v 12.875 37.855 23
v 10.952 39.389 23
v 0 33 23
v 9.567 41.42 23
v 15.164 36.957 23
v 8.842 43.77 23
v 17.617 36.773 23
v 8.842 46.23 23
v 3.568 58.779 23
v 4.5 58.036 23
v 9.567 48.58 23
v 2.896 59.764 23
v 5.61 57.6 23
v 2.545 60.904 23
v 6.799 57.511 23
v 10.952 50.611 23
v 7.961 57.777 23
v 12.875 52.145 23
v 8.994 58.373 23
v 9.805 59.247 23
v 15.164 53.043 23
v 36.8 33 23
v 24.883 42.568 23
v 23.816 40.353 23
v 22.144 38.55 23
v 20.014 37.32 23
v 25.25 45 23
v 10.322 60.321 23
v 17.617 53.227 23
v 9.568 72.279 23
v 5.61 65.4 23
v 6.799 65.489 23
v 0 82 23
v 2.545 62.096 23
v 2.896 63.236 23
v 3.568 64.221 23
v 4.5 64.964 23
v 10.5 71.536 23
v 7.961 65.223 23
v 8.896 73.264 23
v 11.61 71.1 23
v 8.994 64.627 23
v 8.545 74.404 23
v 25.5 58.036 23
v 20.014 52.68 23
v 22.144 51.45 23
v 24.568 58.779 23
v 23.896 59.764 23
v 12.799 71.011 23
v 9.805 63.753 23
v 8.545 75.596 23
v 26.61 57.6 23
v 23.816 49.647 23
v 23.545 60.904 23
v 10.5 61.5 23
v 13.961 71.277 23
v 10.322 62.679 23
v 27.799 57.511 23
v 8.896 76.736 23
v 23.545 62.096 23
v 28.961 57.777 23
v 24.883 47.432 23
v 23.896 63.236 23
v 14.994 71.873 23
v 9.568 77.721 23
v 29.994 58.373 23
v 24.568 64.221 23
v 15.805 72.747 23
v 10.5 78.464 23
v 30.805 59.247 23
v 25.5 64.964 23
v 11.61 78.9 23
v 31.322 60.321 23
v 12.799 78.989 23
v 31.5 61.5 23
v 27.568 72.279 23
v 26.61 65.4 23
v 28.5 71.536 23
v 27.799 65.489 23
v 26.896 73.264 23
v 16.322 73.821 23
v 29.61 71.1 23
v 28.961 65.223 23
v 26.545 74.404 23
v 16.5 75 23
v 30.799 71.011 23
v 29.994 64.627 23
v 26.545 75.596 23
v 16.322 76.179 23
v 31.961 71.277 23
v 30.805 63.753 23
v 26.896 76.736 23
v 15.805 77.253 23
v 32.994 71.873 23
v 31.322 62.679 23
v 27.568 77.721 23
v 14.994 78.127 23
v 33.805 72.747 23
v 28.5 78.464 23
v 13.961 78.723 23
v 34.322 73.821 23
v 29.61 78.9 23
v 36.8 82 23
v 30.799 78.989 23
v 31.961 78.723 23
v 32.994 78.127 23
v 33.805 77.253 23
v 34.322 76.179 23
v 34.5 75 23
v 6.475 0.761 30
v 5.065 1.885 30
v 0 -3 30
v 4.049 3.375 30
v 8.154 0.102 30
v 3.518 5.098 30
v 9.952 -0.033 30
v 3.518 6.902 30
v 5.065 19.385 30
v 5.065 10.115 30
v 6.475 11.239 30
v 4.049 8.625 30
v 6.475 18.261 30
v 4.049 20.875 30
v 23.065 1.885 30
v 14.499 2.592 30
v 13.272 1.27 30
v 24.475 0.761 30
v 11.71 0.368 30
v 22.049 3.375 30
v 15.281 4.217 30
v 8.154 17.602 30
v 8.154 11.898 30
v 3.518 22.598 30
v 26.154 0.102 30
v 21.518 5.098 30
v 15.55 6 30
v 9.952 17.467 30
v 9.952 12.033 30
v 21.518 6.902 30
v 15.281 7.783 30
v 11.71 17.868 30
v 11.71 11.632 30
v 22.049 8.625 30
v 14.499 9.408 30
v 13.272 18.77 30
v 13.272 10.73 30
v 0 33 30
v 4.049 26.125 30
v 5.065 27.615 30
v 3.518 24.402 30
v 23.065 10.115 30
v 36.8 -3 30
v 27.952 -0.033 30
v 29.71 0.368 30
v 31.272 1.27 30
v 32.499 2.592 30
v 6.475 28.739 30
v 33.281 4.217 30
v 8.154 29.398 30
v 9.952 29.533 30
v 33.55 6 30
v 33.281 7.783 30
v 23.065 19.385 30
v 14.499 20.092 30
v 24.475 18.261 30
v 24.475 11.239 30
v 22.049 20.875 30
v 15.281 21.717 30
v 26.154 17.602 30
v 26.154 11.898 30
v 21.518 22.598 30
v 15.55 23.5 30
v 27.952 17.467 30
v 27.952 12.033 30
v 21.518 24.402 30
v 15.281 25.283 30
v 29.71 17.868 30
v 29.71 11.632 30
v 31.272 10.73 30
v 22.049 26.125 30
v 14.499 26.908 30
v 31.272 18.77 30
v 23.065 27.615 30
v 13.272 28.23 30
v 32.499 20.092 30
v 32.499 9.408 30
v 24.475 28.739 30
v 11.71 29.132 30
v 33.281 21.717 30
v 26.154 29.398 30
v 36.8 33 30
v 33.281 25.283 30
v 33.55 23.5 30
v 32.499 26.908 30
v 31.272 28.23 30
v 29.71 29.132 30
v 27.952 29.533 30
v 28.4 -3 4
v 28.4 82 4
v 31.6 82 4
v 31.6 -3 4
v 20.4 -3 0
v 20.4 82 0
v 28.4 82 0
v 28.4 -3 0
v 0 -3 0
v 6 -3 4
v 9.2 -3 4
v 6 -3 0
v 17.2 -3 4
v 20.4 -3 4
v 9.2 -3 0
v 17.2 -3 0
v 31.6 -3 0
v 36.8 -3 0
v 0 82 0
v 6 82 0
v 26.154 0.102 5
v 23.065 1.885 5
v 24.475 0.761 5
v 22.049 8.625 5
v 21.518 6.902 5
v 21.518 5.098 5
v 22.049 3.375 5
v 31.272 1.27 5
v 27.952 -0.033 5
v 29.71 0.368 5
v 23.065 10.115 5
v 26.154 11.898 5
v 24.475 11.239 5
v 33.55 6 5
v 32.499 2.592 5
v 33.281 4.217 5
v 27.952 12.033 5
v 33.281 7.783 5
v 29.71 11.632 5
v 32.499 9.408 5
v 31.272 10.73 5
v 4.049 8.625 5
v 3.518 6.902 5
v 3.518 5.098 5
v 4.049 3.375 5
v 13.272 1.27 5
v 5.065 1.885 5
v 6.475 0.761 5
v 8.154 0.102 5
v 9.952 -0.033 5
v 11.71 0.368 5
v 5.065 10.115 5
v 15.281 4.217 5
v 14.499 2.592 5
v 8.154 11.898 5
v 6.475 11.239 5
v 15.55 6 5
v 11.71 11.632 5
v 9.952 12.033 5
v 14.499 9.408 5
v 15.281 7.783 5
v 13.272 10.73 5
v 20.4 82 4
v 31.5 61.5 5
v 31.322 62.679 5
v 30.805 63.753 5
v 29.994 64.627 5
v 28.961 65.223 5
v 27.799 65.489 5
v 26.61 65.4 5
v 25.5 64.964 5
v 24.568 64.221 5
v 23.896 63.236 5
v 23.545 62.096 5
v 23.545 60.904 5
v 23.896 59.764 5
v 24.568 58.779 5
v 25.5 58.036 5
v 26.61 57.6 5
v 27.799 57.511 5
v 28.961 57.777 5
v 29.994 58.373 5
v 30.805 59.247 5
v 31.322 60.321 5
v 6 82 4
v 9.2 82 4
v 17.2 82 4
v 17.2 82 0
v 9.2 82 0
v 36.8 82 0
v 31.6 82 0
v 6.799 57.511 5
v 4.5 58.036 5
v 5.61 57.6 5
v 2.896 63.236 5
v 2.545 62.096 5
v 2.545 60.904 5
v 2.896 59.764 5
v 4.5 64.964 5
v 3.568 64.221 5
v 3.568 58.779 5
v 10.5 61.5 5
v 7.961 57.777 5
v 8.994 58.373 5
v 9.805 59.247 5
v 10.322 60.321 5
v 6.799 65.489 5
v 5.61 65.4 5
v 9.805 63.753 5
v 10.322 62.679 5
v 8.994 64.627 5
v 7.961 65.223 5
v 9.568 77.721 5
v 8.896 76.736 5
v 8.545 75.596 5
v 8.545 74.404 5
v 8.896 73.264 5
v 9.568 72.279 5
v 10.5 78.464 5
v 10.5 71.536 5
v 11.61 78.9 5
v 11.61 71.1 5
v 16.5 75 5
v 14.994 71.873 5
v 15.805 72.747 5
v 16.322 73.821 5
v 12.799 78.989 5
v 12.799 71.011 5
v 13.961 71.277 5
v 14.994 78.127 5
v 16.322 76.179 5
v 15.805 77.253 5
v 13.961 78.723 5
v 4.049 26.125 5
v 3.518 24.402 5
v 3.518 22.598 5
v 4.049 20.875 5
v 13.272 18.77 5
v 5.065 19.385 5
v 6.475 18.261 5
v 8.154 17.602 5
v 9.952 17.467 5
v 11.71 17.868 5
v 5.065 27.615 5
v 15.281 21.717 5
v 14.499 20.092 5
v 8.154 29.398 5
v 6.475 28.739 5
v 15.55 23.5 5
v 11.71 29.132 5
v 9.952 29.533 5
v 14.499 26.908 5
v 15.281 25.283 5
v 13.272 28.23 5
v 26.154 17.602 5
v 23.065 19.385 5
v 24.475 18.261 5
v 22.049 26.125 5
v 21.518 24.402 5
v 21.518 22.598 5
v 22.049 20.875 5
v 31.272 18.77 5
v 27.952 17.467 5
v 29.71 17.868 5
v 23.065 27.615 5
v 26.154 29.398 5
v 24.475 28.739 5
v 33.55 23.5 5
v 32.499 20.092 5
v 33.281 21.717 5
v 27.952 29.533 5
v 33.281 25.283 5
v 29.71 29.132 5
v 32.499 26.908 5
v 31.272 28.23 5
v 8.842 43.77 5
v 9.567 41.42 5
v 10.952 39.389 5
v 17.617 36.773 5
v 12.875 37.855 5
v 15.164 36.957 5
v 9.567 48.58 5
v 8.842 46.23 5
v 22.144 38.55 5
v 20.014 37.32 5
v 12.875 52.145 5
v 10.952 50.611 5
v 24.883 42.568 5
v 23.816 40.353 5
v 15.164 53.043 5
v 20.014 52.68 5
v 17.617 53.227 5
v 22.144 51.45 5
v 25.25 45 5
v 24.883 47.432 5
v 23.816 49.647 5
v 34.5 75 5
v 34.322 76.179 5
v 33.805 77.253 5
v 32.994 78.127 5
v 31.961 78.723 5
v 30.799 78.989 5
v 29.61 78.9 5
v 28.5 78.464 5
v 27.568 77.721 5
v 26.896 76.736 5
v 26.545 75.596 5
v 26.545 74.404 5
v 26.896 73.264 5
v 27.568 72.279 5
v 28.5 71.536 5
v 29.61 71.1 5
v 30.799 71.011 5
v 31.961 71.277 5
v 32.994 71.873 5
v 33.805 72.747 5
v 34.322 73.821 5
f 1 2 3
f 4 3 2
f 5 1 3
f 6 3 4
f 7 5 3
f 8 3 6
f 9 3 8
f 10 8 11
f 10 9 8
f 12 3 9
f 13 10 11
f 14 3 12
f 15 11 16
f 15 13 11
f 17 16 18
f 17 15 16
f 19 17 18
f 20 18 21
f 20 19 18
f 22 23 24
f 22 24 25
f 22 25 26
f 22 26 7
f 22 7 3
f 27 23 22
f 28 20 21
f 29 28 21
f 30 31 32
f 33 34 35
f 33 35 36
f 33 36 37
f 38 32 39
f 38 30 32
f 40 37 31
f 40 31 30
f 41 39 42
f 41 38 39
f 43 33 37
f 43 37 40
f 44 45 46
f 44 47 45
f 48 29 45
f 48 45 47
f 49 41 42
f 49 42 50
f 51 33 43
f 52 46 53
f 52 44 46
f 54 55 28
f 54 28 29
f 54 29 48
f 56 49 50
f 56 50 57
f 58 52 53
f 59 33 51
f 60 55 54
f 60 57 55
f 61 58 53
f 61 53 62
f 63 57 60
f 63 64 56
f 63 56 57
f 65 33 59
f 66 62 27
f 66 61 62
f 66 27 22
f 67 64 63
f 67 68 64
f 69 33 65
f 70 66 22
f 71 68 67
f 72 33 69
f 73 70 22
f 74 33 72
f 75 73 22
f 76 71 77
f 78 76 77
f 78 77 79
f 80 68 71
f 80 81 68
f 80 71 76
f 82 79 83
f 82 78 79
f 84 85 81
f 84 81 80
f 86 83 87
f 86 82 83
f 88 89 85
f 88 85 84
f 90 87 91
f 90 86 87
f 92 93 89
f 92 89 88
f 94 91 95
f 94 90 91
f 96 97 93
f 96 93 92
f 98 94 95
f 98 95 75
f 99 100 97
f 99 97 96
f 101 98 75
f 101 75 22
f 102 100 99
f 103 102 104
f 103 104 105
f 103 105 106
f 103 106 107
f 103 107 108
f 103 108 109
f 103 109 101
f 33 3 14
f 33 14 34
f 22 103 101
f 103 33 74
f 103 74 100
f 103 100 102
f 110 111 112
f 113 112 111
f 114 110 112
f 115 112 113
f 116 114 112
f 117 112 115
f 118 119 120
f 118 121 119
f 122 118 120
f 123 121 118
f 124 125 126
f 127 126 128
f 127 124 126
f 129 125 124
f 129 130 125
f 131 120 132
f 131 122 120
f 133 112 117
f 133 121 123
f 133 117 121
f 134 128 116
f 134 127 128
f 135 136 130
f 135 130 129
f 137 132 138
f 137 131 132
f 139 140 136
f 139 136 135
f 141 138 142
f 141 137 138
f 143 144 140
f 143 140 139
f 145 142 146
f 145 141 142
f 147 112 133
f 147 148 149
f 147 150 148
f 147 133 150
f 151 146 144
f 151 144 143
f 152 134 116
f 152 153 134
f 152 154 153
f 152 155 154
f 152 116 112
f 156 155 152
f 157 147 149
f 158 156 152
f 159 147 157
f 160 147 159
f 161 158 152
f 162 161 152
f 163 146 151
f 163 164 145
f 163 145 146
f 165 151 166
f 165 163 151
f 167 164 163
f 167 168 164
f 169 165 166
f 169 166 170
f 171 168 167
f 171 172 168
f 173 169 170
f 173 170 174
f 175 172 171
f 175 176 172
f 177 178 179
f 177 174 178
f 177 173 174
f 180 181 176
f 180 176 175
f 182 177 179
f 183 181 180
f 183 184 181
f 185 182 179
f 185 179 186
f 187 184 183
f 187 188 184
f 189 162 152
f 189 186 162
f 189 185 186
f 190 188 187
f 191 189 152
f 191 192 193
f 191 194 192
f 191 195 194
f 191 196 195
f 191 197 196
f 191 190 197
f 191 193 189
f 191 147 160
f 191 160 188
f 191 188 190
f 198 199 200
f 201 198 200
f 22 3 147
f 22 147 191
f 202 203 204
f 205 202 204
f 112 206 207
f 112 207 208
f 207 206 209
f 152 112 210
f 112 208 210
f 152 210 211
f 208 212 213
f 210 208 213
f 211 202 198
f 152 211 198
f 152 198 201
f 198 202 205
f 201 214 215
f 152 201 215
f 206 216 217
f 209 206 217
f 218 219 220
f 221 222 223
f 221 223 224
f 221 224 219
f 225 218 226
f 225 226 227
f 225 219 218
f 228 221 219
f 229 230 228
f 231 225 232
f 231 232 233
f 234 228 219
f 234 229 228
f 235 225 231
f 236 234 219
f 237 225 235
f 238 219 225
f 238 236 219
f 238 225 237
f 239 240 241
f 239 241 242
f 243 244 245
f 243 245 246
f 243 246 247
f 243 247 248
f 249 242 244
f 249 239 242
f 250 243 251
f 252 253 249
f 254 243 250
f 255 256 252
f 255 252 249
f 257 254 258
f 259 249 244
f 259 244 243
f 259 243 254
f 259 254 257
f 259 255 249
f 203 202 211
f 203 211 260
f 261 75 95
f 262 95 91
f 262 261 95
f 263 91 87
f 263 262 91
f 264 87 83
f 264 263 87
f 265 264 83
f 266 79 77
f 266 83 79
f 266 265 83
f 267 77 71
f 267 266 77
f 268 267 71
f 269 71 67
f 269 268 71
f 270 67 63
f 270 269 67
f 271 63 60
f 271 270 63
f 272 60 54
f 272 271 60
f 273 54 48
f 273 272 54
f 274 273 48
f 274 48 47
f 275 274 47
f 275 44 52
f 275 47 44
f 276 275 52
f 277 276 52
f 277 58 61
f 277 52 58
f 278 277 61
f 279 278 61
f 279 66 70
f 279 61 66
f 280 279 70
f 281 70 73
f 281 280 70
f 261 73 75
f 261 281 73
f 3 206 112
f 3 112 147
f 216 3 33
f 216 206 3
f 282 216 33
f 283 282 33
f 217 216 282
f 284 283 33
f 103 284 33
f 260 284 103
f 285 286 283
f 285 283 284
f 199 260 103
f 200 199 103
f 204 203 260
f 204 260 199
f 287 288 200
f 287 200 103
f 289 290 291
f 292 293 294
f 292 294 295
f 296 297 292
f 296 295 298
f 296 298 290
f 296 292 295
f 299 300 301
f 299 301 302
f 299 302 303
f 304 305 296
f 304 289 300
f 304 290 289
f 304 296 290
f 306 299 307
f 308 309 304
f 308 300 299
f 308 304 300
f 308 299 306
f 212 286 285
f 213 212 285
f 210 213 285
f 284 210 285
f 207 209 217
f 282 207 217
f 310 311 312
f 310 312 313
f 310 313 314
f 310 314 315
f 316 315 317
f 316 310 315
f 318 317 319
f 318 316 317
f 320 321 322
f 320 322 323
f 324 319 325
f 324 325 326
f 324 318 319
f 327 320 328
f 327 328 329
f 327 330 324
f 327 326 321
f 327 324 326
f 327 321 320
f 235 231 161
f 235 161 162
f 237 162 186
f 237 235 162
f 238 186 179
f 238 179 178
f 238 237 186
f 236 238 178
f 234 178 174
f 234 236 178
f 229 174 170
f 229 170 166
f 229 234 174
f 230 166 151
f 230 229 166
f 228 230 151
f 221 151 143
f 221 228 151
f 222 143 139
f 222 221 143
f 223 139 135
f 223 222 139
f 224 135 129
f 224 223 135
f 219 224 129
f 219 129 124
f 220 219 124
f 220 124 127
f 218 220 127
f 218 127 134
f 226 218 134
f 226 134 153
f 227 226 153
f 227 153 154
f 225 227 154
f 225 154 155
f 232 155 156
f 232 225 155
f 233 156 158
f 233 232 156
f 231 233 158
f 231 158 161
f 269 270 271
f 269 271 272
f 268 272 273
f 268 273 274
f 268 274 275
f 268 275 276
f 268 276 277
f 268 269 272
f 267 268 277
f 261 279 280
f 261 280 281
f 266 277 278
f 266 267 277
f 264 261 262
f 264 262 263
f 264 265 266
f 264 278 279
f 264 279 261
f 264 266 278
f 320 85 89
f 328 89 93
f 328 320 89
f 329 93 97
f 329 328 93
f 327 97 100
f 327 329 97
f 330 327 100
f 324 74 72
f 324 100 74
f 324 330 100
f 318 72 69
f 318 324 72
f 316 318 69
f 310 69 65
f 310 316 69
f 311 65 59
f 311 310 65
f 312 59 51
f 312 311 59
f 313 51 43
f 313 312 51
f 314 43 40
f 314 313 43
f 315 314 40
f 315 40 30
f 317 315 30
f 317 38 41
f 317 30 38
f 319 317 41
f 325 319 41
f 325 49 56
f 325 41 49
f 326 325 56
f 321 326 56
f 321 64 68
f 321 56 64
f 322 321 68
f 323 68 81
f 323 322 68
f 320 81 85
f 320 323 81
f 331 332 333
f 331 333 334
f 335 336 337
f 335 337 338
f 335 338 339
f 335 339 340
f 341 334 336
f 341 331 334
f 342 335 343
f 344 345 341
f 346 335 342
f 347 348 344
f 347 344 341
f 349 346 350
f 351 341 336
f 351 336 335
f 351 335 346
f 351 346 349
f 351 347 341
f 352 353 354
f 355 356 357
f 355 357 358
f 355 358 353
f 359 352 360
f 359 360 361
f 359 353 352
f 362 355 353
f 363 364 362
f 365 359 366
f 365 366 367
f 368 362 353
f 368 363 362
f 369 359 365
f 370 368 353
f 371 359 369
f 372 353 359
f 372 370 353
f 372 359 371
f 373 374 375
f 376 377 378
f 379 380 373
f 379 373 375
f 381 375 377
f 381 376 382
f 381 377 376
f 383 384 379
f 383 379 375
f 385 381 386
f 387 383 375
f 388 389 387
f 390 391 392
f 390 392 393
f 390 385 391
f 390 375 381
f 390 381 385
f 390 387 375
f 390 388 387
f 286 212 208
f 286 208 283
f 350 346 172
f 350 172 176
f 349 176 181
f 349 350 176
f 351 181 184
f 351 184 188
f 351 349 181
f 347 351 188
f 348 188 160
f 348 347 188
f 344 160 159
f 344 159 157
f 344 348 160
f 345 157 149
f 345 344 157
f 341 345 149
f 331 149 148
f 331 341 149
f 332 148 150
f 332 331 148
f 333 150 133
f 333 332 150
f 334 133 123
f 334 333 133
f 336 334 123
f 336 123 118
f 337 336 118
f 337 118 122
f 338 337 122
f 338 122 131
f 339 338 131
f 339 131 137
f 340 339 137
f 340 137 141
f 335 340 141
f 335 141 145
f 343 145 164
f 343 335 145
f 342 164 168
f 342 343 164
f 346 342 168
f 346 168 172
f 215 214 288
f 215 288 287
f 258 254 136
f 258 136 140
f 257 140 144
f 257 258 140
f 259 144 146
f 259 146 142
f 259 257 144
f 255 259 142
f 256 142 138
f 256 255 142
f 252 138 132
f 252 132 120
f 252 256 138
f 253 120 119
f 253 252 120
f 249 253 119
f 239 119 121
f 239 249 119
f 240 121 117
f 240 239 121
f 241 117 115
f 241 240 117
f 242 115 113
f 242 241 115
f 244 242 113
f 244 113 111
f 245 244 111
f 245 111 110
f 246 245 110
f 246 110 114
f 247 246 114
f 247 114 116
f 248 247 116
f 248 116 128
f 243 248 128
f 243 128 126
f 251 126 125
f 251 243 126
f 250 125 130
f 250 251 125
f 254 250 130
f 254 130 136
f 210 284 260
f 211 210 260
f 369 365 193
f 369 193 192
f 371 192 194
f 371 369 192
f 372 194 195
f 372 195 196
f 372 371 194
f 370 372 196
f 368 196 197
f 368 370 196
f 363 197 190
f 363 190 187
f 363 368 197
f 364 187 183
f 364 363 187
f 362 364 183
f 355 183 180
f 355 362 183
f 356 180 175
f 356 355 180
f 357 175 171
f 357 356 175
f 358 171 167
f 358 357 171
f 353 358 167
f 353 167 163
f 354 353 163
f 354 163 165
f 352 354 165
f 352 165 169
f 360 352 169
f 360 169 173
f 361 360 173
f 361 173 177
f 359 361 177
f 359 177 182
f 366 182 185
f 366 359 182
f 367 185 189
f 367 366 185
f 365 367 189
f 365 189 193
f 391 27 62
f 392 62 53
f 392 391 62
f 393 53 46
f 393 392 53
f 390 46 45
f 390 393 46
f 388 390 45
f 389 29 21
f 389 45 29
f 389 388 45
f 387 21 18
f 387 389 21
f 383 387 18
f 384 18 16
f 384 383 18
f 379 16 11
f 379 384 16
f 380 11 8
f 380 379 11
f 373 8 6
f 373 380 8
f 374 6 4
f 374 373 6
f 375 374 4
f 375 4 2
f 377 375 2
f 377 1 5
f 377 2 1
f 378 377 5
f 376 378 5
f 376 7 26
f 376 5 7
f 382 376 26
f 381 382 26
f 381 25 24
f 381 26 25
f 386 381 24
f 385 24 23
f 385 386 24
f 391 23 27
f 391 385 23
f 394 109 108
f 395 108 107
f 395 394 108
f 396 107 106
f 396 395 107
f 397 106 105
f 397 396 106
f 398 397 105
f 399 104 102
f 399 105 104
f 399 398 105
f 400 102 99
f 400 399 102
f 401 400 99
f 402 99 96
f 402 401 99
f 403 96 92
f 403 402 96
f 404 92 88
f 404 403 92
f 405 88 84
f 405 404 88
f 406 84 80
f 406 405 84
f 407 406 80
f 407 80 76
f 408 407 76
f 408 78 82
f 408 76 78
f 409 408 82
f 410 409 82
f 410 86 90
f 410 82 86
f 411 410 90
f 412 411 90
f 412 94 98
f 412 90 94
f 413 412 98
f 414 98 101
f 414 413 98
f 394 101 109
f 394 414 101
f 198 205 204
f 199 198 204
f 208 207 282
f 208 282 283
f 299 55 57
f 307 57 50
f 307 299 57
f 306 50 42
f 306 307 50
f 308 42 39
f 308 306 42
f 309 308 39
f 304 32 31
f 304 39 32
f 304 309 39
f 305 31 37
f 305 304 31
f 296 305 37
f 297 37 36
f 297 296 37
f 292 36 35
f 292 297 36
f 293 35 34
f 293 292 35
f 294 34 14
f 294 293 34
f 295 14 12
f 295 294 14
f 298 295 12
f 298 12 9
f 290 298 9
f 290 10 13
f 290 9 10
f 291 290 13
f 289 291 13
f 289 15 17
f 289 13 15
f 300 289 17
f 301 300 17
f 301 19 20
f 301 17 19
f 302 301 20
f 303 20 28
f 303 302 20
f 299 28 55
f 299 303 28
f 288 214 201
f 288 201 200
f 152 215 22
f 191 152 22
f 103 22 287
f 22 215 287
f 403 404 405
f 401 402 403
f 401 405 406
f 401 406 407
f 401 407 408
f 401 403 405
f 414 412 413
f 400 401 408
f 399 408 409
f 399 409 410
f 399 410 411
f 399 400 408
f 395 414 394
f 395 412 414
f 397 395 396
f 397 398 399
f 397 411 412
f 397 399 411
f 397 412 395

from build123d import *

# Parameters (mm, degrees)
CYLINDER008_R     = 8.25
CYLINDER008_DEPTH = 30
BOX008_W          = 3.2
BOX008_H          = 90
BOX008_DEPTH      = 4
BOX006_W          = 3.2
BOX006_H          = 90
BOX006_DEPTH      = 4
BOX004_W          = 3.2
BOX004_H          = 90
BOX004_DEPTH      = 4
CYLINDER007_R     = 4
CYLINDER007_DEPTH = 25
CYLINDER006_R     = 4
CYLINDER006_DEPTH = 25
CYLINDER005_R     = 4
CYLINDER005_DEPTH = 25
CYLINDER004_R     = 4
CYLINDER004_DEPTH = 25
CYLINDER003_R     = 6.05
CYLINDER003_DEPTH = 25
CYLINDER002_R     = 6.05
CYLINDER002_DEPTH = 25
CYLINDER001_R     = 6.05
CYLINDER001_DEPTH = 25
CYLINDER_R        = 6.05
CYLINDER_DEPTH    = 25
BOX001_W          = 40
BOX001_H          = 55
BOX001_DEPTH      = 7
BOX_W             = 36.8
BOX_H             = 85
BOX_DEPTH         = 30


with BuildPart() as cylinder008:
    # Cylinder008 → Cylinder008 (new body)
    with BuildSketch(Plane(origin=(17, 45, 5), x_dir=(1, 0, 0), z_dir=(0, 0, 1))):
        Circle(CYLINDER008_R)
    extrude(amount=CYLINDER008_DEPTH)


with BuildPart() as cube008:
    # Box008 → Box008 (new body)
    with BuildSketch(Plane(origin=(28.4, -3, 0), x_dir=(1, 0, 0), z_dir=(0, 0, 1))):
        with Locations((1.6, 45)):
            Rectangle(BOX008_W, BOX008_H)
    extrude(amount=BOX008_DEPTH)


with BuildPart() as cube006:
    # Box006 → Box006 (new body)
    with BuildSketch(Plane(origin=(17.2, -3, 0), x_dir=(1, 0, 0), z_dir=(0, 0, 1))):
        with Locations((1.6, 45)):
            Rectangle(BOX006_W, BOX006_H)
    extrude(amount=BOX006_DEPTH)


with BuildPart() as cube004:
    # Box004 → Box004 (new body)
    with BuildSketch(Plane(origin=(6, -3, 0), x_dir=(1, 0, 0), z_dir=(0, 0, 1))):
        with Locations((1.6, 45)):
            Rectangle(BOX004_W, BOX004_H)
    extrude(amount=BOX004_DEPTH)


with BuildPart() as cylinder007:
    # Cylinder007 → Cylinder007 (new body)
    with BuildSketch(Plane(origin=(6.5, 61.5, 5), x_dir=(1, 0, 0), z_dir=(0, 0, 1))):
        Circle(CYLINDER007_R)
    extrude(amount=CYLINDER007_DEPTH)


with BuildPart() as cylinder006:
    # Cylinder006 → Cylinder006 (new body)
    with BuildSketch(Plane(origin=(30.5, 75, 5), x_dir=(1, 0, 0), z_dir=(0, 0, 1))):
        Circle(CYLINDER006_R)
    extrude(amount=CYLINDER006_DEPTH)


with BuildPart() as cylinder005:
    # Cylinder005 → Cylinder005 (new body)
    with BuildSketch(Plane(origin=(27.5, 61.5, 5), x_dir=(1, 0, 0), z_dir=(0, 0, 1))):
        Circle(CYLINDER005_R)
    extrude(amount=CYLINDER005_DEPTH)


with BuildPart() as cylinder004:
    # Cylinder004 → Cylinder004 (new body)
    with BuildSketch(Plane(origin=(12.5, 75, 5), x_dir=(1, 0, 0), z_dir=(0, 0, 1))):
        Circle(CYLINDER004_R)
    extrude(amount=CYLINDER004_DEPTH)


with BuildPart() as cylinder003:
    # Cylinder003 → Cylinder003 (new body)
    with BuildSketch(Plane(origin=(27.5, 23.5, 5), x_dir=(1, 0, 0), z_dir=(0, 0, 1))):
        Circle(CYLINDER003_R)
    extrude(amount=CYLINDER003_DEPTH)


with BuildPart() as cylinder002:
    # Cylinder002 → Cylinder002 (new body)
    with BuildSketch(Plane(origin=(9.5, 23.5, 5), x_dir=(1, 0, 0), z_dir=(0, 0, 1))):
        Circle(CYLINDER002_R)
    extrude(amount=CYLINDER002_DEPTH)


with BuildPart() as cylinder001:
    # Cylinder001 → Cylinder001 (new body)
    with BuildSketch(Plane(origin=(27.5, 6, 5), x_dir=(1, 0, 0), z_dir=(0, 0, 1))):
        Circle(CYLINDER001_R)
    extrude(amount=CYLINDER001_DEPTH)


with BuildPart() as cylinder:
    # Cylinder → Cylinder (new body)
    with BuildSketch(Plane(origin=(9.5, 6, 5), x_dir=(1, 0, 0), z_dir=(0, 0, 1))):
        Circle(CYLINDER_R)
    extrude(amount=CYLINDER_DEPTH)


with BuildPart() as cube001:
    # Box001 → Box001 (new body)
    with BuildSketch(Plane(origin=(0, 33, 23), x_dir=(1, 0, 0), z_dir=(0, 0, 1))):
        with Locations((20, 27.5)):
            Rectangle(BOX001_W, BOX001_H)
    extrude(amount=BOX001_DEPTH)


with BuildPart() as cut012:
    # Box → Box (new body)
    with BuildSketch(Plane(origin=(0, -3, 0), x_dir=(1, 0, 0), z_dir=(0, 0, 1))):
        with Locations((18.4, 42.5)):
            Rectangle(BOX_W, BOX_H)
    extrude(amount=BOX_DEPTH)

    # Cut: cut Cube001
    add(cube001.part, mode=Mode.SUBTRACT)

    # Cut001: cut Cylinder
    add(cylinder.part, mode=Mode.SUBTRACT)

    # Cut002: cut Cylinder001
    add(cylinder001.part, mode=Mode.SUBTRACT)

    # Cut003: cut Cylinder002
    add(cylinder002.part, mode=Mode.SUBTRACT)

    # Cut004: cut Cylinder003
    add(cylinder003.part, mode=Mode.SUBTRACT)

    # Cut005: cut Cylinder004
    add(cylinder004.part, mode=Mode.SUBTRACT)

    # Cut006: cut Cylinder005
    add(cylinder005.part, mode=Mode.SUBTRACT)

    # Cut007: cut Cylinder006
    add(cylinder006.part, mode=Mode.SUBTRACT)

    # Cut008: cut Cylinder007
    add(cylinder007.part, mode=Mode.SUBTRACT)

    # Cut009: cut Cube004
    add(cube004.part, mode=Mode.SUBTRACT)

    # Cut010: cut Cube006
    add(cube006.part, mode=Mode.SUBTRACT)

    # Cut011: cut Cube008
    add(cube008.part, mode=Mode.SUBTRACT)

    # Cut012: cut Cylinder008
    add(cylinder008.part, mode=Mode.SUBTRACT)


solid = cut012.part
